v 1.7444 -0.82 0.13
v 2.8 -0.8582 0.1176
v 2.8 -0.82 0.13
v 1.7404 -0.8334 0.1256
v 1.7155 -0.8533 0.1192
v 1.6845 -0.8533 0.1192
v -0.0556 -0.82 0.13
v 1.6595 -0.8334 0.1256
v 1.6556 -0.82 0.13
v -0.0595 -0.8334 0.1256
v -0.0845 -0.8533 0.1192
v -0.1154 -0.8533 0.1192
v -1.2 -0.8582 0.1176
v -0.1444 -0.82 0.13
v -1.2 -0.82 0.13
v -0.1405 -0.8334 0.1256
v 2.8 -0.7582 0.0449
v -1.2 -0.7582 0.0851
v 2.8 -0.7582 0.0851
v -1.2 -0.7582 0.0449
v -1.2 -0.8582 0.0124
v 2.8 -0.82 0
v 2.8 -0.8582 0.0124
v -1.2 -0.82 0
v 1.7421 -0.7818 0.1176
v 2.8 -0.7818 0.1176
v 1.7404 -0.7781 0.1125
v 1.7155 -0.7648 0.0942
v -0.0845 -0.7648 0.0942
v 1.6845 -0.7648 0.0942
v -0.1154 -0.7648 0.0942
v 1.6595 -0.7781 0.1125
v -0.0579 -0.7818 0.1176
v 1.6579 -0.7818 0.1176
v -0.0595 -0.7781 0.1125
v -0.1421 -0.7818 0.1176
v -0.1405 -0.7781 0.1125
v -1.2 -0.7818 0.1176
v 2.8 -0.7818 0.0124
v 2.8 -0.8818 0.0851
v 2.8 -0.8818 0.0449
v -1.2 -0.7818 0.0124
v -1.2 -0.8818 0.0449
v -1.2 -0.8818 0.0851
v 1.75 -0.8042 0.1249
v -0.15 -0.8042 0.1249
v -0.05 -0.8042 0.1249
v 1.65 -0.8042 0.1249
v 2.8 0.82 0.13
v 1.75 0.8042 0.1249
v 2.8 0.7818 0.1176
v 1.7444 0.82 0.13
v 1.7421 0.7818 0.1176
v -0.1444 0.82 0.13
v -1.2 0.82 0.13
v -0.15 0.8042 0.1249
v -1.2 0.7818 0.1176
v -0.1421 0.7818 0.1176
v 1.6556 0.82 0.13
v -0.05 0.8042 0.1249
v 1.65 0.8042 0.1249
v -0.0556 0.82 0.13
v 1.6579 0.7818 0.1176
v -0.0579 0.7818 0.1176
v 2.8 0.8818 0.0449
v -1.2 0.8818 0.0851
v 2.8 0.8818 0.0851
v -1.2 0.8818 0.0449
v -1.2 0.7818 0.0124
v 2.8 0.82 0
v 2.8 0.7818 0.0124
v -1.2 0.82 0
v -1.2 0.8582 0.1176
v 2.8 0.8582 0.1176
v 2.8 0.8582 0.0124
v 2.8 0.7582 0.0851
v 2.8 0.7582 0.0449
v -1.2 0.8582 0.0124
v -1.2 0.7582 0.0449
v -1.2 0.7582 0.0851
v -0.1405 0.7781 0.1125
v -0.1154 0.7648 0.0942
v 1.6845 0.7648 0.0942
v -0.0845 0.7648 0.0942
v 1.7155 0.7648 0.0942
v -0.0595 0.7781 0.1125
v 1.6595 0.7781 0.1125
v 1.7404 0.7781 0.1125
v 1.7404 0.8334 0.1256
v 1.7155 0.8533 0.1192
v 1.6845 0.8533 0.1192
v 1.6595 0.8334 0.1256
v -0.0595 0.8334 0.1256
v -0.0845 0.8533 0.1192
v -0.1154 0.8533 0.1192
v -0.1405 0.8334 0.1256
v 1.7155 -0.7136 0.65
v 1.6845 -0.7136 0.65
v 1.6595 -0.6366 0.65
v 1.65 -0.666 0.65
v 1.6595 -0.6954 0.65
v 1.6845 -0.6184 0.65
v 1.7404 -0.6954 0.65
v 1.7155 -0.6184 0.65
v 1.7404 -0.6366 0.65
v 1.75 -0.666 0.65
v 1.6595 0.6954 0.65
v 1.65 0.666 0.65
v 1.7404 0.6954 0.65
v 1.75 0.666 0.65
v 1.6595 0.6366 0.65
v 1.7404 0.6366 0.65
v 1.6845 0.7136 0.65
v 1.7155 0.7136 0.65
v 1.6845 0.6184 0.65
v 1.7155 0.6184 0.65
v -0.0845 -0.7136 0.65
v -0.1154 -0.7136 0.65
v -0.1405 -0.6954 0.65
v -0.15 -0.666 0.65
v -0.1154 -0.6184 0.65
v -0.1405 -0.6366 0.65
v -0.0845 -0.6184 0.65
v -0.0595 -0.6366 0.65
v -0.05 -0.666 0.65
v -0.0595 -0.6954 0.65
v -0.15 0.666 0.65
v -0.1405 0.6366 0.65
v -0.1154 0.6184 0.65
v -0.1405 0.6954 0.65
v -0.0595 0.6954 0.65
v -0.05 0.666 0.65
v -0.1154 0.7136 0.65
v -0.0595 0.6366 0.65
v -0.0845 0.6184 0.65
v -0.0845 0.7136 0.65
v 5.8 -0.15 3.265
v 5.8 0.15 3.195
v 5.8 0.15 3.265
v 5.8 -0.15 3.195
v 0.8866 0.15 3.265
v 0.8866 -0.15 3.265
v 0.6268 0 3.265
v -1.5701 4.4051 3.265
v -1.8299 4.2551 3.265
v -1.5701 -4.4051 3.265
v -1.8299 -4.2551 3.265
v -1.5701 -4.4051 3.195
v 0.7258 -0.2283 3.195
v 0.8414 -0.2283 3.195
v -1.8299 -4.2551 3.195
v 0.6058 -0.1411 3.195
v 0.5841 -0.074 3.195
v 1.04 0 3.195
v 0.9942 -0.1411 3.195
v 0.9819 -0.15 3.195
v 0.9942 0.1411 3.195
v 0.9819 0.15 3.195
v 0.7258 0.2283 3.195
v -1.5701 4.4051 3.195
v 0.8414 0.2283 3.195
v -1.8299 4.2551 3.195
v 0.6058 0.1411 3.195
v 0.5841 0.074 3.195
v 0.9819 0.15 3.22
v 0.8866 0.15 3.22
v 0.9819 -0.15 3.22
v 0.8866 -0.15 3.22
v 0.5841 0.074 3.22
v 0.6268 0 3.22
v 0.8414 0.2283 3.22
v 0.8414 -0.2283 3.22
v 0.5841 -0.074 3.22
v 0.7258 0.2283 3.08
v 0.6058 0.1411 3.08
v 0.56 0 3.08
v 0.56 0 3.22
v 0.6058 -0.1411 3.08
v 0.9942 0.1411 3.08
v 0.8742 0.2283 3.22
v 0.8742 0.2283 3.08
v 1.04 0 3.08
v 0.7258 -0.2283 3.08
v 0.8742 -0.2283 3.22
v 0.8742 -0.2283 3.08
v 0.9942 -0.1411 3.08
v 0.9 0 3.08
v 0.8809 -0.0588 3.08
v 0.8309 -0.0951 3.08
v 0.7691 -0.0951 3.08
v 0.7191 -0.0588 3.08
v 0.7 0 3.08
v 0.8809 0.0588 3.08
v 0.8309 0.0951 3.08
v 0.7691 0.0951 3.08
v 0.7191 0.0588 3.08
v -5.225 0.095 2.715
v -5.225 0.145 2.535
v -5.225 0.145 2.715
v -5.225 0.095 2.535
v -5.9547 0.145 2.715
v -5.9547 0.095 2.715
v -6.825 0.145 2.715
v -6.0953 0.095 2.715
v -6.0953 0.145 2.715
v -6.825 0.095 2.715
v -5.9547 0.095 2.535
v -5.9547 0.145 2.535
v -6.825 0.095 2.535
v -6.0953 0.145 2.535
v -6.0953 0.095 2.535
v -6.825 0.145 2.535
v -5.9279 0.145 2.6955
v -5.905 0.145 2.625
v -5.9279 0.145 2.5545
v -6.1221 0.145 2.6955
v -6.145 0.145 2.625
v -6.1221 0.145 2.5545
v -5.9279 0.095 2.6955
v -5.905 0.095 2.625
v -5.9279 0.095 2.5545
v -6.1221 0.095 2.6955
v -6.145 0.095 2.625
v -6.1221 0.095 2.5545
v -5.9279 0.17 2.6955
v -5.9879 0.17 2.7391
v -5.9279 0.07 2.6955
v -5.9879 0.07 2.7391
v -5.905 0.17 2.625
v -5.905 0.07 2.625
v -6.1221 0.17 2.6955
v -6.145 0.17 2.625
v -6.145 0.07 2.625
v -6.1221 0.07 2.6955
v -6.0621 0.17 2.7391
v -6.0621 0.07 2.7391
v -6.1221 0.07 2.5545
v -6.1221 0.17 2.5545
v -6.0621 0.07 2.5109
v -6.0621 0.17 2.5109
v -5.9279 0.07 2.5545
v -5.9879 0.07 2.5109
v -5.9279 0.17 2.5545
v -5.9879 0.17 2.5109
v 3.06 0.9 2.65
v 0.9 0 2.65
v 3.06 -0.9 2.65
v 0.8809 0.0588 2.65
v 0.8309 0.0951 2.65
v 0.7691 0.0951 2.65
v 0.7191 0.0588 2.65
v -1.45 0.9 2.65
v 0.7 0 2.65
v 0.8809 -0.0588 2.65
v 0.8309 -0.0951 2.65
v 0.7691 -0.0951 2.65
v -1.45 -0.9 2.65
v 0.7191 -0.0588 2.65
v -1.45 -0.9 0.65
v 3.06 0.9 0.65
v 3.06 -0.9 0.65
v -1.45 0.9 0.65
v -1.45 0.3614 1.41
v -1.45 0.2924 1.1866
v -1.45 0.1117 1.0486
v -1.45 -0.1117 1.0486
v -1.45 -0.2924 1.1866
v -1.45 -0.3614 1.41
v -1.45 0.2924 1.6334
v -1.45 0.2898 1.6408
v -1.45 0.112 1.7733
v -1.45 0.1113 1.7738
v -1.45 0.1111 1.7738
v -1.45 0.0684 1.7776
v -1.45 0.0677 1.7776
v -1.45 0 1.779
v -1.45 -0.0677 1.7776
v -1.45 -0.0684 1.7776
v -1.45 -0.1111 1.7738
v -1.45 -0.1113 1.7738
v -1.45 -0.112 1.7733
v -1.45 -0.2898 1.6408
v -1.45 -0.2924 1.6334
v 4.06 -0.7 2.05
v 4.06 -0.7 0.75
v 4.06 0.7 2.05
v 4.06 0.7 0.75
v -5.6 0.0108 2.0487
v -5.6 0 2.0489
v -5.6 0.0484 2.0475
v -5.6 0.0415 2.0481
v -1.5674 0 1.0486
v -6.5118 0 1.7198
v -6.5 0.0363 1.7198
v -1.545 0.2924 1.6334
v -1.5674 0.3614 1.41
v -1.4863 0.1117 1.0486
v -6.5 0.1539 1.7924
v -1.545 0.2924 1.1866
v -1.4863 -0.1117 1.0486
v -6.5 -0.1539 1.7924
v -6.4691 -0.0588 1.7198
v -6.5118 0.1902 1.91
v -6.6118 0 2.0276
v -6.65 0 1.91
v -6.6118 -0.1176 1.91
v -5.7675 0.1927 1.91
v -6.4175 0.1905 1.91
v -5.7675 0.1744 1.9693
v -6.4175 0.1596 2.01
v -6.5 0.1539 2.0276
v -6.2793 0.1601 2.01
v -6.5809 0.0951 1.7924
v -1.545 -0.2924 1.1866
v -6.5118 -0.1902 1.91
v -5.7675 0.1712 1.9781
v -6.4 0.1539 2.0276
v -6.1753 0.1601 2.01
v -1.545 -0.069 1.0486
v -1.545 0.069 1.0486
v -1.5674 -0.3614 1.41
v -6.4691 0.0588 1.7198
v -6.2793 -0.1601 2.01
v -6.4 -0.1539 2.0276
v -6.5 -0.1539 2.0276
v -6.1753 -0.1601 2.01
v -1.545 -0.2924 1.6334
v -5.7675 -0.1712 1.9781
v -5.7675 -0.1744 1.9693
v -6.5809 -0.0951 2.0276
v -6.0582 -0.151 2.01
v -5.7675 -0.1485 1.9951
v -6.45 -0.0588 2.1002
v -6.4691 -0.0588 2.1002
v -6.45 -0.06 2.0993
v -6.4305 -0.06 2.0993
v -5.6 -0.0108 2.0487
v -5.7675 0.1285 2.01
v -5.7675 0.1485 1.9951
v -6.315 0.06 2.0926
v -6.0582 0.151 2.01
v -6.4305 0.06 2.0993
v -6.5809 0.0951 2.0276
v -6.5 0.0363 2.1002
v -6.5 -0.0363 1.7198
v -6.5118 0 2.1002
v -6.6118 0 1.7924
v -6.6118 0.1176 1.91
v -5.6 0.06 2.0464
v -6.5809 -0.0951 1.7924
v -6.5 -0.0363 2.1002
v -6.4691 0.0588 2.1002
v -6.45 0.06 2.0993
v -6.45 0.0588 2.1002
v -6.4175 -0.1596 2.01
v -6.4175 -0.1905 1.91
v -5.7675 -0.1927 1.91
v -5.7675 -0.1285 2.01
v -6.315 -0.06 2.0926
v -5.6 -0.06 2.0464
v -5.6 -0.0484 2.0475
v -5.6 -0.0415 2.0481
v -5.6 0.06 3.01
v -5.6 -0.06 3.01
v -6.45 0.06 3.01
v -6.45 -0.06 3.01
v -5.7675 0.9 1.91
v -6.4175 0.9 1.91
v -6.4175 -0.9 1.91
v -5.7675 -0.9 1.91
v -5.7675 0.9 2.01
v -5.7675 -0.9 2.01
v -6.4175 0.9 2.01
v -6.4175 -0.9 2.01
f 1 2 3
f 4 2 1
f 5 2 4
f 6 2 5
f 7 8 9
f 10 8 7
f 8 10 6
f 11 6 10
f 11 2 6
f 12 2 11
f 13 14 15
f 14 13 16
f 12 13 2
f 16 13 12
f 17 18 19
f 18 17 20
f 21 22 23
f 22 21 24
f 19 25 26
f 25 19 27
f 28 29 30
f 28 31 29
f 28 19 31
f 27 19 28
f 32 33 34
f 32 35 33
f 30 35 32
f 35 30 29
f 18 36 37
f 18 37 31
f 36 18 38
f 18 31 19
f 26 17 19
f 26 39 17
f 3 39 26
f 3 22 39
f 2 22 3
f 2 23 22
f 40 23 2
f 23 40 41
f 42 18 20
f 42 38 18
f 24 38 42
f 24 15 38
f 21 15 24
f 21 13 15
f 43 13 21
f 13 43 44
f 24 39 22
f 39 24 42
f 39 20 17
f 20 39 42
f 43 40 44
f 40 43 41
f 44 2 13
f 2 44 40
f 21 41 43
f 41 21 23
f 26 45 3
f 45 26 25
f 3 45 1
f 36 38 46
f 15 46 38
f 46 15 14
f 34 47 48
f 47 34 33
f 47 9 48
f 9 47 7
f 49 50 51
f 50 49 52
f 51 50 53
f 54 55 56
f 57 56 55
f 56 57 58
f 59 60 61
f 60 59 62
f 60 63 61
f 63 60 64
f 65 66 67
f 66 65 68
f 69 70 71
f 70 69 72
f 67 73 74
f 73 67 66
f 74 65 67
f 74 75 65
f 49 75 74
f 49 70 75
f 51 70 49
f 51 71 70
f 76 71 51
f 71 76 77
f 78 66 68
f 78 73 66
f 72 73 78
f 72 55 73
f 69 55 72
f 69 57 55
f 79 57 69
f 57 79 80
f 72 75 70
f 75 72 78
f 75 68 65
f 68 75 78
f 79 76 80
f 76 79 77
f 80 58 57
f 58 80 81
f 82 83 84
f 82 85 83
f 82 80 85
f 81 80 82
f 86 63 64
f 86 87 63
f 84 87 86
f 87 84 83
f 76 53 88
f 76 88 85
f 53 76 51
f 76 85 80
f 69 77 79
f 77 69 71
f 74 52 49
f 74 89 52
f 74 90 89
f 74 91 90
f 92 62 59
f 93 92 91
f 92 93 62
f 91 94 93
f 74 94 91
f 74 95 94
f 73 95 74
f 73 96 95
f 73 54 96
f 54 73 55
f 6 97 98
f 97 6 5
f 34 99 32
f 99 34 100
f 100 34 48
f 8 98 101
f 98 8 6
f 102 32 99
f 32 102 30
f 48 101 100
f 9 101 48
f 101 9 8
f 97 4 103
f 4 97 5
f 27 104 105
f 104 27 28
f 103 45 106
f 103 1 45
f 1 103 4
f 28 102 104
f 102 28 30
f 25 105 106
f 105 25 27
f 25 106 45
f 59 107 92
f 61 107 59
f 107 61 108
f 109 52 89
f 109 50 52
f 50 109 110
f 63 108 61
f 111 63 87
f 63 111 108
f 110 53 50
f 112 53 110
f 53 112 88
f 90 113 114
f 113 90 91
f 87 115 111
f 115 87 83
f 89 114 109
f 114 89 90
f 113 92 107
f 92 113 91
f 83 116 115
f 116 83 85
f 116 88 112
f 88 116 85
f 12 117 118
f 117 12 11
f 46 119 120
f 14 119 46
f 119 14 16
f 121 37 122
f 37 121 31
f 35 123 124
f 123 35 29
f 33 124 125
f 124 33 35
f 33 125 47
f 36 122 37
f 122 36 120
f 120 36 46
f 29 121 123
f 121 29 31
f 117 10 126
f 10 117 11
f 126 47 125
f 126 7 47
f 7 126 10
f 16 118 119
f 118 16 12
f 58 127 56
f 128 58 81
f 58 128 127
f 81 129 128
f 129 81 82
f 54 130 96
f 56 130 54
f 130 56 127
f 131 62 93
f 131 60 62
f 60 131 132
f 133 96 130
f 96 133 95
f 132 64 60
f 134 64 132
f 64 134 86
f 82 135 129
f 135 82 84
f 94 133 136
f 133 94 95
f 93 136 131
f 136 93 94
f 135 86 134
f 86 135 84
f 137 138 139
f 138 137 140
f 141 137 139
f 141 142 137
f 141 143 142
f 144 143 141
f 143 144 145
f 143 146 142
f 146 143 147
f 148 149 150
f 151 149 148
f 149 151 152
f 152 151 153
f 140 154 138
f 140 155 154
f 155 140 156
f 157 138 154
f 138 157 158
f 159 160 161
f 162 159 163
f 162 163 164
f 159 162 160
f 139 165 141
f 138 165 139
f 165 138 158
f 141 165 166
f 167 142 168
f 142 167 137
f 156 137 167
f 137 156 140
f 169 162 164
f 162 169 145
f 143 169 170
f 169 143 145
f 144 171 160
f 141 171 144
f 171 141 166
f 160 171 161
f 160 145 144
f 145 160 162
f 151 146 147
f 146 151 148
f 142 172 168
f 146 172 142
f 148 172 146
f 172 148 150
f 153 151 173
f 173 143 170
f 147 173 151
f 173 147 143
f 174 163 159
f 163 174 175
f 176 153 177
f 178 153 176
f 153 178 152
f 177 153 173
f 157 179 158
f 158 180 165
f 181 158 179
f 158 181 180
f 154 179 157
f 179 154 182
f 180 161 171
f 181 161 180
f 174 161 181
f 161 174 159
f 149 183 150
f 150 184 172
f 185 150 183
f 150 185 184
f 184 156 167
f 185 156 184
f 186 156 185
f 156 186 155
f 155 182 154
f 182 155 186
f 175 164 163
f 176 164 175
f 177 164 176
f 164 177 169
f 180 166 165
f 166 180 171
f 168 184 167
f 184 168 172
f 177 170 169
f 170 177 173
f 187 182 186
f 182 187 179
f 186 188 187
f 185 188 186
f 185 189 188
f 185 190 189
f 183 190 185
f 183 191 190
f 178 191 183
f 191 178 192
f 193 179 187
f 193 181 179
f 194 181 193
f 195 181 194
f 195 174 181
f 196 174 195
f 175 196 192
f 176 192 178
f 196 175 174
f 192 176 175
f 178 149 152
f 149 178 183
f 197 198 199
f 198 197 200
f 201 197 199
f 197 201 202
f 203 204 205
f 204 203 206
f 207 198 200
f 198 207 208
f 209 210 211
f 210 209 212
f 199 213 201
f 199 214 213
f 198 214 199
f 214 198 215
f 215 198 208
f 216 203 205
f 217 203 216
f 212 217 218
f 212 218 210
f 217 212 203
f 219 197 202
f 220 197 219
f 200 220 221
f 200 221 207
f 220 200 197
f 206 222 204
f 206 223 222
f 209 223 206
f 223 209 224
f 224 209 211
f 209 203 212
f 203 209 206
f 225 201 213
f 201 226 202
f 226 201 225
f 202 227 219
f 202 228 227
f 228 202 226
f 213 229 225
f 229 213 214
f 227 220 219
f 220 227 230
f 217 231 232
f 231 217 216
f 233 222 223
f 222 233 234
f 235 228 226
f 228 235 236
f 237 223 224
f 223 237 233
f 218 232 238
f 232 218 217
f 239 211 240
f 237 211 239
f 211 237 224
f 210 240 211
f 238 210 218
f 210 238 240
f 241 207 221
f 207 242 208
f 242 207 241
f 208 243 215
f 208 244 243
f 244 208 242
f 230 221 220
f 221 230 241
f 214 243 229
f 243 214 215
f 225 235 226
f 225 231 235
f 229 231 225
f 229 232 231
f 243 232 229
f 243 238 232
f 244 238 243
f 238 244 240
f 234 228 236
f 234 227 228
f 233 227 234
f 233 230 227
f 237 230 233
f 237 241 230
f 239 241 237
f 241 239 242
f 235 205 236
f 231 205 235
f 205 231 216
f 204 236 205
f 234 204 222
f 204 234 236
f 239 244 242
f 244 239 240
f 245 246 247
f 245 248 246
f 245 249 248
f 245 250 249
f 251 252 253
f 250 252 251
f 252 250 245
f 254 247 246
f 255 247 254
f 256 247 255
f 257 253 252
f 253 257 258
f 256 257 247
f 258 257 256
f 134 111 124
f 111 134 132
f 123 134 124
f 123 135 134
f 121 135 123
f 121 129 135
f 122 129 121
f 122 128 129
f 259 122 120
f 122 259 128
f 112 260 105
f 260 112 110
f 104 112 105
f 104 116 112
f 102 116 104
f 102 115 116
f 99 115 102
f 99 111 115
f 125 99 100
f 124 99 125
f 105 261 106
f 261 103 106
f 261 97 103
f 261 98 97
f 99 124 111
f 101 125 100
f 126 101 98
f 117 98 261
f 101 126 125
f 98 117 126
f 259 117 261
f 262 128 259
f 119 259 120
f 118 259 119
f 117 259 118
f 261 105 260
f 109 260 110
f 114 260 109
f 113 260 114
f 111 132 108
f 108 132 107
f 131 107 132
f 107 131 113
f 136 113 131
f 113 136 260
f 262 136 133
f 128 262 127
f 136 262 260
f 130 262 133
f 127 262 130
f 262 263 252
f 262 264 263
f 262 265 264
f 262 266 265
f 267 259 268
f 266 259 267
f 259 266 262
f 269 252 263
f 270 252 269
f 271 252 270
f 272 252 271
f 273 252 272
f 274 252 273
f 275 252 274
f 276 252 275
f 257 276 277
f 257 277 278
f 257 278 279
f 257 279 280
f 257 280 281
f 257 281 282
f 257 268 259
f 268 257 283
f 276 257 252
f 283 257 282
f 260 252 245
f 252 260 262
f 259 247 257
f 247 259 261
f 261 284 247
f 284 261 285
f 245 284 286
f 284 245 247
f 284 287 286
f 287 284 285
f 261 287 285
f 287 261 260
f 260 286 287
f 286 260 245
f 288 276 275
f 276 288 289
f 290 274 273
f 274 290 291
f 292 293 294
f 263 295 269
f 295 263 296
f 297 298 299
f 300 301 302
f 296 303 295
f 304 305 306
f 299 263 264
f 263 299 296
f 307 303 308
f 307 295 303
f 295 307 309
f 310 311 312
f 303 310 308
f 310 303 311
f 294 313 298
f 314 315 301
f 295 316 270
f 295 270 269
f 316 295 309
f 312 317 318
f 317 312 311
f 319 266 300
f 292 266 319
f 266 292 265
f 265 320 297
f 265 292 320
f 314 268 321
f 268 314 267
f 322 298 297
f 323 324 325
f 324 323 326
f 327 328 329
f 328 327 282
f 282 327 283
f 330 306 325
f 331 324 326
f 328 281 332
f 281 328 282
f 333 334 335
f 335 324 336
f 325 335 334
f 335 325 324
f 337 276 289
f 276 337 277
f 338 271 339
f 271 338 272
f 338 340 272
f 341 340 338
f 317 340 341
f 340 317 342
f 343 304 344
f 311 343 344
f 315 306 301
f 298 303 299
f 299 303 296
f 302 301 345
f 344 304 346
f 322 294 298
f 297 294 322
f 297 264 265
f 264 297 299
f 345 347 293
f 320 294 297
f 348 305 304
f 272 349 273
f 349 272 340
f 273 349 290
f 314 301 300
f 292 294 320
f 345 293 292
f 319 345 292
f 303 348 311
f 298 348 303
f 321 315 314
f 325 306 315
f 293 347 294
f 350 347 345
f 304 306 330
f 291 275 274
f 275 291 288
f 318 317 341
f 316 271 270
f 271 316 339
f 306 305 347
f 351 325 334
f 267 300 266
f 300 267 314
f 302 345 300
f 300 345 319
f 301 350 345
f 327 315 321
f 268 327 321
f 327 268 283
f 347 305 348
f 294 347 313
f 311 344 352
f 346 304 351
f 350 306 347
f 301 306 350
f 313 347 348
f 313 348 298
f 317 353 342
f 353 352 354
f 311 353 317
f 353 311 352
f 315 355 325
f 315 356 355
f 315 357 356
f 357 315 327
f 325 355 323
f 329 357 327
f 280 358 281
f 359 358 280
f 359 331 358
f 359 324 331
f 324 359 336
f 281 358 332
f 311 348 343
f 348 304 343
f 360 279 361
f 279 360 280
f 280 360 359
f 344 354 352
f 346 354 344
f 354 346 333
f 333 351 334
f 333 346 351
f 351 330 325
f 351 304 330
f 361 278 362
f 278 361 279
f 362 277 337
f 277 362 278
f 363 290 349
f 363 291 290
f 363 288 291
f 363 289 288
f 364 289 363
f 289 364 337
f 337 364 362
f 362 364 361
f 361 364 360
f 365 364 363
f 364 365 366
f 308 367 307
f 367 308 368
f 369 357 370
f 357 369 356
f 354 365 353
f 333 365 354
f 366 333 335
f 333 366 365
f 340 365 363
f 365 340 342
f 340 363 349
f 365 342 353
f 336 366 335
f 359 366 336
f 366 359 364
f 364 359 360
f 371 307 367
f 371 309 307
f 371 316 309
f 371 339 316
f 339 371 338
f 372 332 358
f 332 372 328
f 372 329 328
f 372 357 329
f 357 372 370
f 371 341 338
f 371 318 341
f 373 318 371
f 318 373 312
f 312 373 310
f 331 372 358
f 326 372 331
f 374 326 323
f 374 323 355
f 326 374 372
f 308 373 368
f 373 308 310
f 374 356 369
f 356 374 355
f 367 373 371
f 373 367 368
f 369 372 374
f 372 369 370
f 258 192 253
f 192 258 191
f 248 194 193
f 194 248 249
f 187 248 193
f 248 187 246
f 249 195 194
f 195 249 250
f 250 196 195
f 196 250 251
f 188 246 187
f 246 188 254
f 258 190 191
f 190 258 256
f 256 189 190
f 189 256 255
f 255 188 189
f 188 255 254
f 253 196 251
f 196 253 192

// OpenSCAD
// Helicopter — heli-ski transport. Ferries guests to off-piste drop zones.
// Based loosely on a Bell 407 / AS350 Écureuil class light helicopter.
//
// Conventions, units, and axis docs: see models-src/README.md.
//
//   +X = forward (nose, direction of flight)
//   +Y = lateral
//   +Z = up
//
// Origin at Z = 0, centre of footprint (midpoint between skids at ground).
// Reference (Bell 407): fuselage 9.4 m · rotor diameter 10.7 m · height 3.6 m

$fn = 10;

// ── Dimensions (metres) ────────────────────────────────────────────────────

// Fuselage
body_cx = 0.8;   // X of block centre — shifted forward to give tail boom room
body_l  = 4.5;
body_w  = 1.8;
body_h  = 2.0;
body_z  = 0.65;  // Z of fuselage bottom (= strut height above skids)

// Nose / windscreen
nose_l  = 1.0;   // protrusion forward of fuselage front face
nose_w  = 1.4;   // tip width — slightly narrower than body
nose_h  = 1.3;   // tip height — shorter gives forward-leaning windscreen

// Tail boom
boom_l    = 5.0; // fuselage rear → tail rotor plane
boom_r1   = 0.38;
boom_r2   = 0.20;
boom_rise = 0.50; // Z gain from fuselage attach to tail end (up-sweep)

// Tail fin (vertical stabiliser at boom end)
fin_h   = 1.10;
fin_l   = 0.85;
fin_thk = 0.12;

// Horizontal stabilisers (small winglets at boom / fin junction)
stab_span = 1.8;
stab_l    = 0.65;
stab_thk  = 0.10;

// Landing skids
skid_l = 4.0;
skid_r = 0.065;
skid_y = 0.82;  // half-spacing (Y) between skids

// Struts — angled tubes from skids up to fuselage floor
strut_r = 0.05;

// Rotor mast
mast_h = 0.50;
mast_r = 0.10;

// Main rotor (3 blades)
blade_l = 5.0;   // hub centre to blade tip
blade_w = 0.30;  // chord (Y)
blade_h = 0.07;  // thickness (Z)
n_main  = 3;

// Tail rotor (2 blades; axis along Y, blades spin in XZ plane)
tr_l = 0.80;
tr_w = 0.18;  // chord (Z when blade is level)
tr_h = 0.05;  // thickness (Y)
n_tr = 2;

// ── Derived ────────────────────────────────────────────────────────────────
body_front = body_cx + body_l / 2;
body_rear  = body_cx - body_l / 2;
body_top   = body_z  + body_h;
boom_end_x = body_rear - boom_l;
boom_z_fwd = body_z + body_h * 0.38; // attachment Z at fuselage rear
boom_z_end = boom_z_fwd + boom_rise;  // tip Z at tail
mast_top   = body_top + mast_h;

// ── Modules ────────────────────────────────────────────────────────────────

module skids() {
    color([0.18, 0.18, 0.20])
    for (s = [-1, 1])
        translate([body_cx, s * skid_y, skid_r])
            rotate([0, 90, 0])
                cylinder(h = skid_l, r = skid_r, center = true);
}

module struts() {
    // hull() between two point-sized spheres traces an angled strut
    color([0.22, 0.22, 0.24])
    for (sx = [0.9, -0.9])
        for (s = [-1, 1])
            hull() {
                translate([body_cx + sx, s * body_w * 0.37, body_z])
                    sphere(r = strut_r);
                translate([body_cx + sx, s * skid_y, skid_r])
                    sphere(r = strut_r);
            }
}

module fuselage() {
    color([0.85, 0.12, 0.10]) // vivid red — classic heli-ski visibility colour
    translate([body_cx, 0, body_z + body_h / 2])
        cube([body_l, body_w, body_h], center = true);
}

module nose() {
    // hull between fuselage front face and a narrower, slightly lower slab
    // at the tip produces the angled windscreen profile
    color([0.85, 0.12, 0.10])
    hull() {
        translate([body_front, 0, body_z + body_h / 2])
            cube([0.02, body_w, body_h], center = true);
        translate([body_front + nose_l, 0, body_z + body_h / 2 - 0.25])
            cube([0.02, nose_w, nose_h], center = true);
    }
}

module windshield() {
    color([0.06, 0.10, 0.20]) // dark tinted glass
    hull() {
        translate([body_front + 0.02, 0, body_z + body_h * 0.60])
            cube([0.02, body_w * 0.72, body_h * 0.36], center = true);
        translate([body_front + nose_l * 0.65, 0, body_z + body_h * 0.40])
            cube([0.02, nose_w * 0.70, nose_h * 0.45], center = true);
    }
}

module tail_boom() {
    // Tapered tube via hull between two spheres of different radii; slight
    // Z rise gives the characteristic up-swept tail silhouette.
    color([0.78, 0.10, 0.08])
    hull() {
        translate([body_rear, 0, boom_z_fwd])
            sphere(r = boom_r1);
        translate([boom_end_x, 0, boom_z_end])
            sphere(r = boom_r2);
    }
}

module tail_fin() {
    fin_cx = boom_end_x + fin_l / 2;
    fin_cz = boom_z_end + fin_h / 2;
    color([0.72, 0.10, 0.08])
        translate([fin_cx, 0, fin_cz])
            cube([fin_l, fin_thk, fin_h], center = true);
}

module horizontal_stab() {
    stab_cx = boom_end_x + stab_l * 0.55;
    stab_cz = boom_z_end + 0.05;
    color([0.72, 0.10, 0.08])
        translate([stab_cx, 0, stab_cz])
            cube([stab_l, stab_span, stab_thk], center = true);
}

module rotor_mast() {
    color([0.28, 0.28, 0.30])
    translate([body_cx, 0, body_top])
        cylinder(h = mast_h, r = mast_r);
}

module main_rotor() {
    // Hub disc
    color([0.32, 0.32, 0.35])
    translate([body_cx, 0, mast_top])
        cylinder(h = 0.14, r = 0.24, center = true);

    // Blades — each starts at hub centre and extends outward in +X, then
    // rotated 120° apart around Z
    color([0.12, 0.12, 0.14])
    for (i = [0 : n_main - 1])
        translate([body_cx, 0, mast_top + 0.08])
            rotate([0, 0, i * 360 / n_main])
                translate([blade_l / 2, 0, 0])
                    cube([blade_l, blade_w, blade_h], center = true);
}

module tail_rotor() {
    // Hub axis along Y; blades fan in the XZ plane.
    // Mounted port-side (+Y) of the fin, near fin top.
    tr_x = boom_end_x + fin_l * 0.50;
    tr_y = fin_thk / 2 + 0.06;
    tr_z = boom_z_end + fin_h * 0.65;

    color([0.32, 0.32, 0.35])
    translate([tr_x, tr_y, tr_z])
        rotate([90, 0, 0])
            cylinder(h = 0.10, r = 0.12, center = true);

    // Two blades, 180° apart, extending along X from hub centre then rotated
    color([0.12, 0.12, 0.14])
    for (i = [0 : n_tr - 1])
        translate([tr_x, tr_y, tr_z])
            rotate([0, i * 360 / n_tr, 0])
                translate([tr_l / 2, 0, 0])
                    cube([tr_l, tr_h, tr_w], center = true);
}

// ── Assembly ───────────────────────────────────────────────────────────────
module helicopter() {
    skids();
    struts();
    fuselage();
    nose();
    windshield();
    tail_boom();
    tail_fin();
    horizontal_stab();
    rotor_mast();
    main_rotor();
    tail_rotor();
}

helicopter();
